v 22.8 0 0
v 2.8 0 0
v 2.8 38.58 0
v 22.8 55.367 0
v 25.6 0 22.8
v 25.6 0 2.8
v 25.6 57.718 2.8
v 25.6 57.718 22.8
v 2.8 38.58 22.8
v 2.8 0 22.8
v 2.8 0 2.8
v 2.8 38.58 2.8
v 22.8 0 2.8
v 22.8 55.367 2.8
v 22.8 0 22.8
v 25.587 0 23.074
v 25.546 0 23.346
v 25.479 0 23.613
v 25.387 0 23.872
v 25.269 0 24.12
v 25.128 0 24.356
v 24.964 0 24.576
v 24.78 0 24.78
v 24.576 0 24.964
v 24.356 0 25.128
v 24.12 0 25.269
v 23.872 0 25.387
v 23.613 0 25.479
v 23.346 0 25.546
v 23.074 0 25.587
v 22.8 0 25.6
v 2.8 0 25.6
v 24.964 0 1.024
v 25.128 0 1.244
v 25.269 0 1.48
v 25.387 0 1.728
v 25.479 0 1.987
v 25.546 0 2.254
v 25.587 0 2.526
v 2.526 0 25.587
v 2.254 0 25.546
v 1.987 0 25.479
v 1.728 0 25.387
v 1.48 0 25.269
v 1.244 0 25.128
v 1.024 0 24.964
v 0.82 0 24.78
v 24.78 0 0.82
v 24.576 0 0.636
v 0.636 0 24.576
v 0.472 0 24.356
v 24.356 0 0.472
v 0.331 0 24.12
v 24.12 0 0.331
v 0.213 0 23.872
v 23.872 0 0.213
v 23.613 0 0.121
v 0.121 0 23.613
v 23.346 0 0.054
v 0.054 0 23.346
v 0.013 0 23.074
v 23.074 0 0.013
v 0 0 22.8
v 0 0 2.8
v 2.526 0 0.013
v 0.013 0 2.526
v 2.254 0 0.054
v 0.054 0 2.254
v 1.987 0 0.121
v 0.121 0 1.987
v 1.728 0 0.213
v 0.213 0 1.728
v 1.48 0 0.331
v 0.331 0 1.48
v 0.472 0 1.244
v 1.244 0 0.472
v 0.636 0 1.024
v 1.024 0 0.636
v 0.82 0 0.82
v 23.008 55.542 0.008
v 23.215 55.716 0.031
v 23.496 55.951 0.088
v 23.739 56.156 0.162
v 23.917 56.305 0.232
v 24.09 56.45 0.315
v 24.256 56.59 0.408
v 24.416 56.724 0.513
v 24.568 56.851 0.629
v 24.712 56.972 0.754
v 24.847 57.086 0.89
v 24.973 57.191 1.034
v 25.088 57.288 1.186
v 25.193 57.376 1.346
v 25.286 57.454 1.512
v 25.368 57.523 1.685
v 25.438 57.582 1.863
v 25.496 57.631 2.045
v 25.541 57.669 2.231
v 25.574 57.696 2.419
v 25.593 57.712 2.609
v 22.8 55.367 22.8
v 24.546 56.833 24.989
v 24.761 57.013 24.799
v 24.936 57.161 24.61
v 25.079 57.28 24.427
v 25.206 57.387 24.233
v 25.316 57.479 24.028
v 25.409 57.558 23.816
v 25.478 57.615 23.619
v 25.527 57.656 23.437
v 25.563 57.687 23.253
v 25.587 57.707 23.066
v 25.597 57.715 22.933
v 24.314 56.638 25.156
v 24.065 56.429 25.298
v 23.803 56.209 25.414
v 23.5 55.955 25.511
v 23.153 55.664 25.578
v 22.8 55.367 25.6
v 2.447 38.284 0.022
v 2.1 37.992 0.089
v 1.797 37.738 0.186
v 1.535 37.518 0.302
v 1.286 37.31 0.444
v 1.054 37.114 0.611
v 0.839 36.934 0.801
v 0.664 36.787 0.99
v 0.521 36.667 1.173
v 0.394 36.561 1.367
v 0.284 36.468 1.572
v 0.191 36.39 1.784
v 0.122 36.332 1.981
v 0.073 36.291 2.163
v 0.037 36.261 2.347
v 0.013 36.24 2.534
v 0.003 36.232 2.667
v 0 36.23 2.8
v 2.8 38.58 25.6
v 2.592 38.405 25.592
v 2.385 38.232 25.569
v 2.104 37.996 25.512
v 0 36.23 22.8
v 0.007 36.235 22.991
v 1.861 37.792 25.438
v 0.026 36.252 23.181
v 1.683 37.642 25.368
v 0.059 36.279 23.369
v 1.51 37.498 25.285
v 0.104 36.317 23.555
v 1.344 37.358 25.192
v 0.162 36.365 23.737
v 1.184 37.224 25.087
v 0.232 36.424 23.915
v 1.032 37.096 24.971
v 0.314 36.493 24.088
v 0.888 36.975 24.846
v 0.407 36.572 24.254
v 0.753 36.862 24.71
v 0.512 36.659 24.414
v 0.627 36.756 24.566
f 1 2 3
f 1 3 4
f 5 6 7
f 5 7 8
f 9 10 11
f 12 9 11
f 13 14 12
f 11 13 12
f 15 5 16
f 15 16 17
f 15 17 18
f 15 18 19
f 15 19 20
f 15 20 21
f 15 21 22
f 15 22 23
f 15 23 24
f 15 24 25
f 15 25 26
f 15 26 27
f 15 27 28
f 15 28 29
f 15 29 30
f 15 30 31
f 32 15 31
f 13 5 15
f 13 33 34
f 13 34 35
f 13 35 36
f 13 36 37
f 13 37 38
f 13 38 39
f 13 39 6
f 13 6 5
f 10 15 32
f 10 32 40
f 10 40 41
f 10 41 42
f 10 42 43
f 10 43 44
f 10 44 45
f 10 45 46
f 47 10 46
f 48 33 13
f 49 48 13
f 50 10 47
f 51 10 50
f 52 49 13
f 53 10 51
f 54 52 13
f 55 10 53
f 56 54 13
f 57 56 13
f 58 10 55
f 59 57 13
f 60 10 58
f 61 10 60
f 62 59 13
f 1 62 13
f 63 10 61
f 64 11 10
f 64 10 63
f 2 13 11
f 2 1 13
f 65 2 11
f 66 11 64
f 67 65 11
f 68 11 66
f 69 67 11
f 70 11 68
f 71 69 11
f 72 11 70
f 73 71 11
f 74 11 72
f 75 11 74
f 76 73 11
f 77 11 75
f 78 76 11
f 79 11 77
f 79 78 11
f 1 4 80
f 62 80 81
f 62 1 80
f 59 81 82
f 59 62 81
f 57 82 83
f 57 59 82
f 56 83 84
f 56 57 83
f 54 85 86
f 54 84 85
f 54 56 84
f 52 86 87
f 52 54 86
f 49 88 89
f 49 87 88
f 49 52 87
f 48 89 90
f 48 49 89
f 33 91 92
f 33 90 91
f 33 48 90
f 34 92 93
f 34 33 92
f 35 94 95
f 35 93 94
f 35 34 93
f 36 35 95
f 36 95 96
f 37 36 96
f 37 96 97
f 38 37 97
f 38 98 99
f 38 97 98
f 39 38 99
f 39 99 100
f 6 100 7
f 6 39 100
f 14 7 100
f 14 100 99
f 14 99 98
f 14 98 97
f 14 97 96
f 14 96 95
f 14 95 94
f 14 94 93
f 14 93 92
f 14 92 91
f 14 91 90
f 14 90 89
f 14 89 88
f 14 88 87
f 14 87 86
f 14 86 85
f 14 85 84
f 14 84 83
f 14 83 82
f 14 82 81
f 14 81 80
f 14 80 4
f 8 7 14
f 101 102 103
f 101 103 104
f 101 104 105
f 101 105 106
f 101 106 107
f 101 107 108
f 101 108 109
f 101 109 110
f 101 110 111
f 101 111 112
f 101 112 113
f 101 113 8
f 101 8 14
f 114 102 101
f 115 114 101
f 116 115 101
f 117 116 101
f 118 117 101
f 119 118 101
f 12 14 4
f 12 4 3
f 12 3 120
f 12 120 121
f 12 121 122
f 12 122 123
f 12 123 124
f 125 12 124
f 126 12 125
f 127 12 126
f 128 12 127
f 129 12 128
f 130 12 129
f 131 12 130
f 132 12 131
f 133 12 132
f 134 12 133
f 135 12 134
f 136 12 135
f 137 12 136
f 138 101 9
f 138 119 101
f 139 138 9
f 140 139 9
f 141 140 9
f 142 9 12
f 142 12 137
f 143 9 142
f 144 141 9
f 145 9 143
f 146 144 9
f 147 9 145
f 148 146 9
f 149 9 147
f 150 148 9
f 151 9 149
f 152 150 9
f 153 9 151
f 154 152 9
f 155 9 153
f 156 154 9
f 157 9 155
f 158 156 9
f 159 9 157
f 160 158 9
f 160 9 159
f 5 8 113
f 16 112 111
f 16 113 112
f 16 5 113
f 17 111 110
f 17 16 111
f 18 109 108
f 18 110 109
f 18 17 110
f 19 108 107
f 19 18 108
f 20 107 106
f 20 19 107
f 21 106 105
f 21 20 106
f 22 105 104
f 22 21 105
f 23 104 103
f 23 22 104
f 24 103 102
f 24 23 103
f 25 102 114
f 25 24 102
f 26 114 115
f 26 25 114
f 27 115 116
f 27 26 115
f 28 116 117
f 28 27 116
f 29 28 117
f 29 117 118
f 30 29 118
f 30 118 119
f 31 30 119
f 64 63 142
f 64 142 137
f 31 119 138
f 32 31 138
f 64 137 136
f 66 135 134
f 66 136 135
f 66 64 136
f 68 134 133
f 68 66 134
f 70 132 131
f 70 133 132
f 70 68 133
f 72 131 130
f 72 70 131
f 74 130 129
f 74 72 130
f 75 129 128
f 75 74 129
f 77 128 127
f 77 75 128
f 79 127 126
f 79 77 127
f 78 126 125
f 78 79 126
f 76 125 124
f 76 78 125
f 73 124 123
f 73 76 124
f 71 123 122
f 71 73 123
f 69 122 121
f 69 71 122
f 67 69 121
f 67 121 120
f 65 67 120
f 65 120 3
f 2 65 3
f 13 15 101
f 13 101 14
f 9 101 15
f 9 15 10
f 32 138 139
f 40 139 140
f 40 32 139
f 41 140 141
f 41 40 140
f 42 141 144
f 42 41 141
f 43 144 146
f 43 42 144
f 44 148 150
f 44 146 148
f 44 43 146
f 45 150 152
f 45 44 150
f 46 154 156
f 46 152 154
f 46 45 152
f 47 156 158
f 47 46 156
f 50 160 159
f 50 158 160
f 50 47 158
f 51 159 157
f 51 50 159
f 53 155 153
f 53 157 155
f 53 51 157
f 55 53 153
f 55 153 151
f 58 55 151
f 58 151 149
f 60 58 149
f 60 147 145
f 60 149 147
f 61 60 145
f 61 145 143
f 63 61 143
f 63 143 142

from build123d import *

# Parameters (mm, degrees)
BOSS_EXTRUDE1_DEPTH = 60
SKETCH3_W           = 20
SKETCH3_H           = 20
CUT_EXTRUDE1_DEPTH  = 1040.5
CUT_EXTRUDE2_REACH  = 72.077


with BuildPart() as part:
    # Sketch1 → Boss-Extrude1 (new body)
    with BuildSketch(Plane(origin=(0, 0, 0), x_dir=(1, 0, 0), z_dir=(0, 1, 0))):
        with BuildLine():
            Line((2.8, 0), (22.8, 0))
            ThreePointArc((22.8, 0), (24.779898987, -0.820101013), (25.6, -2.8))
            Line((25.6, -2.8), (25.6, -22.8))
            ThreePointArc((25.6, -22.8), (24.779898987, -24.779898987), (22.8, -25.6))
            Line((22.8, -25.6), (2.8, -25.6))
            ThreePointArc((2.8, -25.6), (0.820101013, -24.779898987), (0, -22.8))
            Line((0, -22.8), (0, -2.8))
            ThreePointArc((0, -2.8), (0.820101013, -0.820101013), (2.8, 0))
        make_face()
    extrude(amount=BOSS_EXTRUDE1_DEPTH)

    # Sketch3 → Cut-Extrude1 (cut)
    with BuildSketch(Plane(origin=(0, 0, 0), x_dir=(-1, 0, 0), z_dir=(0, -1, 0))):
        with Locations((-12.8, -12.8)):
            Rectangle(SKETCH3_W, SKETCH3_H)
    extrude(amount=-CUT_EXTRUDE1_DEPTH, mode=Mode.SUBTRACT)

    # Cut-Extrude2: up to this face of the body (flat: up to its plane)
    cut_extrude2_end = Plane(part.part.faces().sort_by_distance((12.8, 30, 0))[0])
    # Sketch4 → Cut-Extrude2 (cut, up to the picked face)
    with BuildSketch(Plane.XY.offset(25.6), mode=Mode.PRIVATE) as cut_extrude2_sk1:
        Polygon((-0.986658786, 35.401585719), (-0.986658786, 60), (27.022015216, 60), (27.022015216, 58.911274466), align=None)
    cut_extrude2_tool1 = split(extrude(cut_extrude2_sk1.sketch, amount=-CUT_EXTRUDE2_REACH, mode=Mode.PRIVATE), bisect_by=cut_extrude2_end, keep=Keep.BOTH, mode=Mode.PRIVATE)
    add(cut_extrude2_tool1.solids().sort_by(Axis((8.745273, 51.785147, 25.6), (0, 0, -1)))[0], mode=Mode.SUBTRACT)


solid = part.part
